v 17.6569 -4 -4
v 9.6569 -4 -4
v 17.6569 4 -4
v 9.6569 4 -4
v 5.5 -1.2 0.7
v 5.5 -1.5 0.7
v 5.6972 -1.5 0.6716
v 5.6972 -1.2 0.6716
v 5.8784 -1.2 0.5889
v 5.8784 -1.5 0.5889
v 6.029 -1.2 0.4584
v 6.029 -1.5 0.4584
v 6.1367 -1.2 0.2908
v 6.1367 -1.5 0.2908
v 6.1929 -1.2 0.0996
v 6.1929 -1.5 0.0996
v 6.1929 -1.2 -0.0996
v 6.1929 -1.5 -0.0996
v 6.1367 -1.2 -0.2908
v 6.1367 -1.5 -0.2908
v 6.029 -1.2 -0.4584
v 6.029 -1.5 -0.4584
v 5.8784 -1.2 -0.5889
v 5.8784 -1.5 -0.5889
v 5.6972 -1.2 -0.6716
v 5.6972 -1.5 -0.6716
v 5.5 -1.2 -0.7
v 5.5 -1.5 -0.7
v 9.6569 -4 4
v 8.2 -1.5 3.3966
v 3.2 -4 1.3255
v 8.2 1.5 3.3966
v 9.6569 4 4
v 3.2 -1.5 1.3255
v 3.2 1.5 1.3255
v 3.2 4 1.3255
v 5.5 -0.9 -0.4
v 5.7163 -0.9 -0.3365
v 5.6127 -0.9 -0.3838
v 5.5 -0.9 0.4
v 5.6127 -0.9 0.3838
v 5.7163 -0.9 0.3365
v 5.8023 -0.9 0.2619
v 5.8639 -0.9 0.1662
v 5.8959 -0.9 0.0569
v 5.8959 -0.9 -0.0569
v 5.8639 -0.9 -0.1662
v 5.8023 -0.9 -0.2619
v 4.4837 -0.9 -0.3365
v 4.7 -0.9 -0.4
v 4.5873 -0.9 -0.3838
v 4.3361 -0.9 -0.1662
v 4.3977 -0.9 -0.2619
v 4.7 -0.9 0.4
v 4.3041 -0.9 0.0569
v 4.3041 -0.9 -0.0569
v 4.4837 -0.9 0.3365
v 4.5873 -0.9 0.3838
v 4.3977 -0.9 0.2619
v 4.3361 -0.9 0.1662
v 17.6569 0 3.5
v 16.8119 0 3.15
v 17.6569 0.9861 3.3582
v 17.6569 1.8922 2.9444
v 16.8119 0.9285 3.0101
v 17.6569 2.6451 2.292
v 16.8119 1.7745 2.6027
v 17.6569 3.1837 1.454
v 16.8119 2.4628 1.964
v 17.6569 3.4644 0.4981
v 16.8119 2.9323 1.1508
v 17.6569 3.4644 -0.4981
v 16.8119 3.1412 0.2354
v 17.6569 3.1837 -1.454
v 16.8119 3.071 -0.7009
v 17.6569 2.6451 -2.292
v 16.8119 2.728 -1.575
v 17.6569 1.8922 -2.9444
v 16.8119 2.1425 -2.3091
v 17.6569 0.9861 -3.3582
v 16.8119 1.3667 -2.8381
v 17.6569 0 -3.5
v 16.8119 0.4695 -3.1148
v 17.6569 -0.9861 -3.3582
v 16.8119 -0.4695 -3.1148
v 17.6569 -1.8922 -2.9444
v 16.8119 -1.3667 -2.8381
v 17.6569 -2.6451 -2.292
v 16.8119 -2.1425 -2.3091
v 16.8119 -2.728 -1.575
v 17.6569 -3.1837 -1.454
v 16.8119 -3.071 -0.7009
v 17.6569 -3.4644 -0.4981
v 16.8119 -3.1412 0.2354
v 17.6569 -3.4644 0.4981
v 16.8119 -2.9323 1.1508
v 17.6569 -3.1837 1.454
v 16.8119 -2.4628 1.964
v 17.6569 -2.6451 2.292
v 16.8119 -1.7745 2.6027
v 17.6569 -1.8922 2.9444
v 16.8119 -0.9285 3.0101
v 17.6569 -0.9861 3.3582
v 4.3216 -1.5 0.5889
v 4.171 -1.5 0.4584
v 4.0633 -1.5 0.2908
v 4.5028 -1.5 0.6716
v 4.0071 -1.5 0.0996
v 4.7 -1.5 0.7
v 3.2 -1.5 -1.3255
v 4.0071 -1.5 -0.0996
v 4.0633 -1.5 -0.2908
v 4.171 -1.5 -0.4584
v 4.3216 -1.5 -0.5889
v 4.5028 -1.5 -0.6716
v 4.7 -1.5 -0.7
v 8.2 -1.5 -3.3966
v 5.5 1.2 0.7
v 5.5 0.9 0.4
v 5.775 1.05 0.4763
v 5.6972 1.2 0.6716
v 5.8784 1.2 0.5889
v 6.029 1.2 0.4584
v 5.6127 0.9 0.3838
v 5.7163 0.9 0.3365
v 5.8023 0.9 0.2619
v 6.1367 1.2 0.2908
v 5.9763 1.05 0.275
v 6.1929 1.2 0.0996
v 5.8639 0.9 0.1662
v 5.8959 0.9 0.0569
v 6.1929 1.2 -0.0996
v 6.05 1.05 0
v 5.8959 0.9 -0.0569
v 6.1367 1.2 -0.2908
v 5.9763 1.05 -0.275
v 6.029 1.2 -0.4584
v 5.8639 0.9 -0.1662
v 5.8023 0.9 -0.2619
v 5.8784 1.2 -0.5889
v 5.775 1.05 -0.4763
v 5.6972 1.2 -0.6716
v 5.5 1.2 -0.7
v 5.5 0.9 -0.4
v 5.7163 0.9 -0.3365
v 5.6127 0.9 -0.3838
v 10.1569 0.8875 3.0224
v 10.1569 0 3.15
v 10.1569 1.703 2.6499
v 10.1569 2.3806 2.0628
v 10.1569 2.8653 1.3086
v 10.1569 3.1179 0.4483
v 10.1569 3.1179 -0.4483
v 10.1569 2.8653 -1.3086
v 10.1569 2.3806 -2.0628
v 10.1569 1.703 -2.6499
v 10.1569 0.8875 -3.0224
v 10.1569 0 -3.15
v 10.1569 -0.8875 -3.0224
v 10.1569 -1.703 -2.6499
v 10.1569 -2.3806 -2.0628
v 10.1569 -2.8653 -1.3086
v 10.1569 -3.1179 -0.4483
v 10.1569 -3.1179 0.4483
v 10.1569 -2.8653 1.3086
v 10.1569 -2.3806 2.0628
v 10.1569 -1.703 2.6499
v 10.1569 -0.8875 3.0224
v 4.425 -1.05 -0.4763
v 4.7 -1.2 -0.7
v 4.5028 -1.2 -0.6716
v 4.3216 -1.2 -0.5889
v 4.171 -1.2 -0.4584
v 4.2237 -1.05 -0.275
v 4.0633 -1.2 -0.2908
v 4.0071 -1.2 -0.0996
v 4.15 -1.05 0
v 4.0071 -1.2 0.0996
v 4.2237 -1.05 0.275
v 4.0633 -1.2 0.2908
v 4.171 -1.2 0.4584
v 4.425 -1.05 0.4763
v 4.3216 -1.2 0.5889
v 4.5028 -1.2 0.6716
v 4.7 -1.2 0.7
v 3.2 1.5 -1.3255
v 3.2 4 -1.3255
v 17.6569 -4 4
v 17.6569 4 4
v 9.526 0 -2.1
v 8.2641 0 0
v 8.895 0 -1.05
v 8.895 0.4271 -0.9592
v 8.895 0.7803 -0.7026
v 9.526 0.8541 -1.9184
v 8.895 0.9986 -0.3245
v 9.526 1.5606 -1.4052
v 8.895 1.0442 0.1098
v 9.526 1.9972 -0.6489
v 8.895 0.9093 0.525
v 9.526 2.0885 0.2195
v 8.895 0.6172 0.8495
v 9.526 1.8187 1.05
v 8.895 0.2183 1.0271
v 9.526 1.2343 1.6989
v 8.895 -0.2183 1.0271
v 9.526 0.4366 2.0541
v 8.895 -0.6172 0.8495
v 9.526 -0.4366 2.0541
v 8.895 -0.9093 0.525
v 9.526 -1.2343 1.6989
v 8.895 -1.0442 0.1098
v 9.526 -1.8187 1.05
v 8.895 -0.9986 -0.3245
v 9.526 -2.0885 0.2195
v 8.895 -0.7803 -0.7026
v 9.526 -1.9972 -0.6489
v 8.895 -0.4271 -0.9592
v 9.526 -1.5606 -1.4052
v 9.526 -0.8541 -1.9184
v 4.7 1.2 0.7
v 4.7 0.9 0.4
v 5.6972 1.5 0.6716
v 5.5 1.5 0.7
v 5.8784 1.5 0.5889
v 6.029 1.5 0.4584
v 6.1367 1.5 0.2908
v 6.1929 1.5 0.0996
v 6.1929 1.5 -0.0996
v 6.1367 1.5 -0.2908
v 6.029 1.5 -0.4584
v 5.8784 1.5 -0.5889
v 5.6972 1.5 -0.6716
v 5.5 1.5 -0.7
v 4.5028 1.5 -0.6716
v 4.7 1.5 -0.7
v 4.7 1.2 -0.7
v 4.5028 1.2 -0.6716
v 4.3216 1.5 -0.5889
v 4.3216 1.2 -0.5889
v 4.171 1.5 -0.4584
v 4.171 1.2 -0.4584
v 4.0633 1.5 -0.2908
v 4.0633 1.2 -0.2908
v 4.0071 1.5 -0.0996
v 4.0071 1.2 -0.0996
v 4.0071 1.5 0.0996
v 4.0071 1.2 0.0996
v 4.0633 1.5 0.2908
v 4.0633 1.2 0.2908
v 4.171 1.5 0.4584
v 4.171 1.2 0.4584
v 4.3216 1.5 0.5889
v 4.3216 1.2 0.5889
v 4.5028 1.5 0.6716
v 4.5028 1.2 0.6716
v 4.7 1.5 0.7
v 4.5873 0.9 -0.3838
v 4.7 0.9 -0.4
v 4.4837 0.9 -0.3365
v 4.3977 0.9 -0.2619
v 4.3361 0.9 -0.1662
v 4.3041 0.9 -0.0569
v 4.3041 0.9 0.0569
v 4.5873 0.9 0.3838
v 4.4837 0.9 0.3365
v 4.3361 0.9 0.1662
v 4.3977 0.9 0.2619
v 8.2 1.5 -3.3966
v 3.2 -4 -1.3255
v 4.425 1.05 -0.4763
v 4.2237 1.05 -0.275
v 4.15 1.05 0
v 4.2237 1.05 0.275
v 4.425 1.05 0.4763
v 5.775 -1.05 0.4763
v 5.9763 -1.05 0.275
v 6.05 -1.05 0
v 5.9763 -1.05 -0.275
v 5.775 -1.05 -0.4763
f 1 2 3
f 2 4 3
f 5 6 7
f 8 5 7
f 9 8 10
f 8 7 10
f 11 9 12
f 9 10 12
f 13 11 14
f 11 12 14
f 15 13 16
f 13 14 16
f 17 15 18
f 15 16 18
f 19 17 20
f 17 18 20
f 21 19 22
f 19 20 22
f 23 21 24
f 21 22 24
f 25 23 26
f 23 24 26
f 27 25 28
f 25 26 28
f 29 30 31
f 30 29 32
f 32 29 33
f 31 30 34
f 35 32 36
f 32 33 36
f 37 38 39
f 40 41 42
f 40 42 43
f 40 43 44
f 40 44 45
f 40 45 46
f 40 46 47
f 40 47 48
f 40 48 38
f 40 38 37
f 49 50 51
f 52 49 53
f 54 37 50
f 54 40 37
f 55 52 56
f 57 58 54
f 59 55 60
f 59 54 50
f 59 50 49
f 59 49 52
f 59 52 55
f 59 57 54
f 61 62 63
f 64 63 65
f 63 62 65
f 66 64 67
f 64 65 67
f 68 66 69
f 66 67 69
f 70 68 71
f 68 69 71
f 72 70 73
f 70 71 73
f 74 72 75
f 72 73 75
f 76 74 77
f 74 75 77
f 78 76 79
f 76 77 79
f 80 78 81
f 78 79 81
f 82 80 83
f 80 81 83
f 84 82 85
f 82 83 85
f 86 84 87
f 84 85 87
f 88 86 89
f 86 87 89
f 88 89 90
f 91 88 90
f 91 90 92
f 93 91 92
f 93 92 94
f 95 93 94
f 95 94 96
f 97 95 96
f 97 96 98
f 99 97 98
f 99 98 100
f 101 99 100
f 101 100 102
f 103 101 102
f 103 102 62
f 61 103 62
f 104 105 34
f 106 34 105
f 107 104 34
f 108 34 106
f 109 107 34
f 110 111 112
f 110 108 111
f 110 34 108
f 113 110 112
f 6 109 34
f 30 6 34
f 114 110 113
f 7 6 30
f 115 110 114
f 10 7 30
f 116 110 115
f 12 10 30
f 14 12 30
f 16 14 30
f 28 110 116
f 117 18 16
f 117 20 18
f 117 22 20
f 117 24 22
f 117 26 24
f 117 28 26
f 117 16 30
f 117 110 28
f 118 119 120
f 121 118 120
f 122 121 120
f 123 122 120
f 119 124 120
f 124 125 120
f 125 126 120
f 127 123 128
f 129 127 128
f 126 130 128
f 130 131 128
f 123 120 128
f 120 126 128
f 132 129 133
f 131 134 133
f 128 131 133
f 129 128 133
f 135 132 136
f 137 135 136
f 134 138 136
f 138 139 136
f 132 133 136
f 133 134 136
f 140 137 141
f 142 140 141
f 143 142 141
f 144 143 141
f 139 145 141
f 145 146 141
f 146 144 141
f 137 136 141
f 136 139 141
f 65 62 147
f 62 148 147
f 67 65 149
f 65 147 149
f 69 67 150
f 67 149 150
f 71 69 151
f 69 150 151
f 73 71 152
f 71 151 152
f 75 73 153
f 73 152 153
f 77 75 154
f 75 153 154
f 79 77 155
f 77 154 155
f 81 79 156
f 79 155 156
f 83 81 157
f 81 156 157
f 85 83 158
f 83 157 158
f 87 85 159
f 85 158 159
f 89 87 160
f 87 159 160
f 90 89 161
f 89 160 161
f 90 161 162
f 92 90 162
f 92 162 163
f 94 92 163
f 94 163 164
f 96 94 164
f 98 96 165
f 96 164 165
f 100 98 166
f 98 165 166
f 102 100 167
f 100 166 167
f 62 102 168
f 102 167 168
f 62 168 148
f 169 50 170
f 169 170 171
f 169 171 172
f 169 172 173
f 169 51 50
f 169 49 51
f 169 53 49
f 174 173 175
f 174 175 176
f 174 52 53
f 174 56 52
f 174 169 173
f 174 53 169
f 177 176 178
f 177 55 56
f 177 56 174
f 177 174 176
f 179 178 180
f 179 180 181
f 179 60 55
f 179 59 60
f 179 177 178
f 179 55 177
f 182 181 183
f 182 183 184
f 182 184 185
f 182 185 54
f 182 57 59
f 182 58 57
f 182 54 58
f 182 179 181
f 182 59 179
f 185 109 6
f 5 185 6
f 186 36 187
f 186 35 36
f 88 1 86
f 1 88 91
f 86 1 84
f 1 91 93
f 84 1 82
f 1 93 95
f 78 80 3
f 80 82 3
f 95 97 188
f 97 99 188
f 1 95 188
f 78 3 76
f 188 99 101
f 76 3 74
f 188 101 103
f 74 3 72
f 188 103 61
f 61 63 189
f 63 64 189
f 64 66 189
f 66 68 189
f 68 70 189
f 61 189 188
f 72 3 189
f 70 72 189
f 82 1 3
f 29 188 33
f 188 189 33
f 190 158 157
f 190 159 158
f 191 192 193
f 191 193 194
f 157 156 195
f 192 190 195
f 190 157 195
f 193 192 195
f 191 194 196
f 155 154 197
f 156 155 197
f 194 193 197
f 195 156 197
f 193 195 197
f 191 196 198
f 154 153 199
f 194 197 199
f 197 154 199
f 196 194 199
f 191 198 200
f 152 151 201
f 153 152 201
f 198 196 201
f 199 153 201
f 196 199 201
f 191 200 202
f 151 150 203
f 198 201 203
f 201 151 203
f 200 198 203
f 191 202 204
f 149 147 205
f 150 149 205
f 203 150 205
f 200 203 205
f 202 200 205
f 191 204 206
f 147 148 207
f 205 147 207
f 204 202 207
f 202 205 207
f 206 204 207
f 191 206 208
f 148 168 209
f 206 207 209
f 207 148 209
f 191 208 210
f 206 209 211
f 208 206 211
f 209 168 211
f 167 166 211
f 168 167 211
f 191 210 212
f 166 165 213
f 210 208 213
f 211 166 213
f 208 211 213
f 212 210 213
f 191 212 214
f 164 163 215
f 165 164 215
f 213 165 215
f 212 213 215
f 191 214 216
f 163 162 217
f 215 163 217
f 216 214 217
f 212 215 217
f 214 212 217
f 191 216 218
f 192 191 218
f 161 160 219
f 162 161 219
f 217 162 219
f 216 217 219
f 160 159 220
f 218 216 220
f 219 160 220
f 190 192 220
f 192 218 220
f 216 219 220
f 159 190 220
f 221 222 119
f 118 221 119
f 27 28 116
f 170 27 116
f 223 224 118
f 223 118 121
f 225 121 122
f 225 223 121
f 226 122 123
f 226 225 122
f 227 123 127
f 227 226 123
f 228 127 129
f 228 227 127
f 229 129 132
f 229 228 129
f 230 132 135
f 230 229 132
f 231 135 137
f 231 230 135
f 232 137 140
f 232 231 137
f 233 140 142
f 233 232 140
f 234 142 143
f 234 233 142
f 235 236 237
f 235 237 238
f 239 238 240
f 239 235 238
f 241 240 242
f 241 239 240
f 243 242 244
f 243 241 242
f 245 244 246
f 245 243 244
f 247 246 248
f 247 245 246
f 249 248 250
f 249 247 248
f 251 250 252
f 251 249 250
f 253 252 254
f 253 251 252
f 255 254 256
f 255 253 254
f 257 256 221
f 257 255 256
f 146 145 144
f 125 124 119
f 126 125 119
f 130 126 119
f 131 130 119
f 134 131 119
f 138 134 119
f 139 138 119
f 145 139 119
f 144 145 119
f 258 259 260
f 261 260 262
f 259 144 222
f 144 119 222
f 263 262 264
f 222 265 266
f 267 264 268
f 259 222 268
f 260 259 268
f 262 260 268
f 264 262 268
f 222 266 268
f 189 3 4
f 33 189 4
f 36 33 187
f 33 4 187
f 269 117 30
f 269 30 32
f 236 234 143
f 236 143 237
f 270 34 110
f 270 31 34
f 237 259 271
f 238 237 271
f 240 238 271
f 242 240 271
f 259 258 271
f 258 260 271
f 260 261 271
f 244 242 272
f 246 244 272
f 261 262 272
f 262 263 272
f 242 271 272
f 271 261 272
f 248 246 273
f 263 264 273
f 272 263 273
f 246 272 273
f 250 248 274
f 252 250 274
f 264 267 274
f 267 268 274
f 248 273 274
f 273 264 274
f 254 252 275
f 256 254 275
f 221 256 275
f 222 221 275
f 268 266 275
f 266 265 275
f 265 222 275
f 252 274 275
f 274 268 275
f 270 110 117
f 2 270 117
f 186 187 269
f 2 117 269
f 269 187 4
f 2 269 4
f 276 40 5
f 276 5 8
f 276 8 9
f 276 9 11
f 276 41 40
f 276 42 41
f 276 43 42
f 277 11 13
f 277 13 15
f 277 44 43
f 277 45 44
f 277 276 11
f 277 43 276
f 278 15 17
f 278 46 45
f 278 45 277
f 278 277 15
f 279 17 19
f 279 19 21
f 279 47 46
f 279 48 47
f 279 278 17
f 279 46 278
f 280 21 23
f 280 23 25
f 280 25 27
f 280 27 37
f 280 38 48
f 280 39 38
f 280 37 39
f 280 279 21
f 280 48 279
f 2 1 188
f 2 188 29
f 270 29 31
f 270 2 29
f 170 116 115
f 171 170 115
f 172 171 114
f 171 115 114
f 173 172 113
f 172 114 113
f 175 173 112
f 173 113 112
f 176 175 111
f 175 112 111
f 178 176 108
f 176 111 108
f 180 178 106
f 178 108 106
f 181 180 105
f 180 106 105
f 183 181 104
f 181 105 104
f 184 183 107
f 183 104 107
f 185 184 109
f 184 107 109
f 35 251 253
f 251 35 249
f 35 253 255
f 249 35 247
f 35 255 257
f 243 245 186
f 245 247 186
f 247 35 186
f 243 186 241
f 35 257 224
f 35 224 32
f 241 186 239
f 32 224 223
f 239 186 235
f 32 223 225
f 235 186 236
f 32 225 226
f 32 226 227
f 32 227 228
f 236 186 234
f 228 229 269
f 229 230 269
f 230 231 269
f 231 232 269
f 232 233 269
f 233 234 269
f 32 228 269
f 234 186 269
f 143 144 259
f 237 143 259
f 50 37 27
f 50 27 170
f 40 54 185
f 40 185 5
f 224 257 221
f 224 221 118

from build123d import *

# Parameters (mm, degrees)
AUFSATZ_LINEAR_AUSTRAGEN1_DEPTH            = 4
SCHNITT_LINEAR_AUSTRAGEN1_DEPTH            = 19.540887303
SCHNITT_LINEAR_AUSTRAGEN1_DEPTH_BACK       = 19.540887303
SKIZZE2_W                                  = 8.2
SKIZZE2_H                                  = 3
AUFSATZ_LINEAR_AUSTRAGEN2_DEPTH            = 0.6
FASE1_SIZE                                 = 0.3
FASE1_OF_SPIEGELN1_SIZE                    = 0.3
SCHNITT_LINEAR_AUSTRAGEN2_DEPTH            = 19.540887303
SCHNITT_LINEAR_AUSTRAGEN2_DEPTH_BACK       = 19.540887303
SKIZZE10_W                                 = 3.2
SKIZZE10_H                                 = 8
F_6_3_6_3_DURCHMESSER_BOHRUNG1_D           = 6.3
F_6_3_6_3_DURCHMESSER_BOHRUNG1_DEPTH       = 7.5
F_6_3_6_3_DURCHMESSER_BOHRUNG1_CSINK_D     = 7
F_6_3_6_3_DURCHMESSER_BOHRUNG1_CSINK_ANGLE = 45
F_6_3_6_3_DURCHMESSER_BOHRUNG1_TIP         = 1.89271095


with BuildPart() as part:
    # Skizze1 → Aufsatz-Linear austragen1 (new, symmetric)
    with BuildSketch(Plane(origin=(0, 0, 0), x_dir=(1, 0, 0), z_dir=(0, 1, 0))):
        with BuildLine():
            Line((2.956414504, 1.224586984), (9.656854249, 4))
            Line((9.656854249, 4), (17.656854249, 4))
            Line((17.656854249, 4), (17.656854249, -4))
            Line((17.656854249, -4), (9.656854249, -4))
            Line((9.656854249, -4), (2.956414504, -1.224586984))
            ThreePointArc((2.956414504, -1.224586984), (3.2, 0), (2.956414504, 1.224586984))
        make_face()
    extrude(amount=AUFSATZ_LINEAR_AUSTRAGEN1_DEPTH, both=True)

    # Skizze2 → Schnitt-Linear austragen1 (cut, two sides: drawn at the far end of the back side and taken through both)
    with BuildSketch(Plane.XY.offset(-SCHNITT_LINEAR_AUSTRAGEN1_DEPTH_BACK)):
        with Locations((4.1, 0)):
            Rectangle(SKIZZE2_W, SKIZZE2_H)
    extrude(amount=SCHNITT_LINEAR_AUSTRAGEN1_DEPTH + SCHNITT_LINEAR_AUSTRAGEN1_DEPTH_BACK, mode=Mode.SUBTRACT)

    # Skizze7 → Aufsatz-Linear austragen2 (add)
    with BuildSketch(Plane.XZ.offset(-1.5)):
        with BuildLine():
            Line((4.7, 0.7), (5.5, 0.7))
            ThreePointArc((5.5, 0.7), (6.2, 0), (5.5, -0.7))
            Line((5.5, -0.7), (4.7, -0.7))
            ThreePointArc((4.7, -0.7), (4, 0), (4.7, 0.7))
        make_face()
    aufsatz_linear_austragen2 = extrude(amount=AUFSATZ_LINEAR_AUSTRAGEN2_DEPTH)

    # Fase1
    fase1_edges = [part.edges().sort_by_distance(p)[0] for p in [
        (4, 0.9, 0),
        (5.1, 0.9, -0.7),
        (6.2, 0.9, 0),
        (5.1, 0.9, 0.7),
    ]]
    chamfer(fase1_edges, length=FASE1_SIZE)

    # Spiegeln1: Aufsatz-Linear austragen2 across plane
    add(aufsatz_linear_austragen2.mirror(Plane.ZX))

    # Fase1 of Spiegeln1
    fase1_of_spiegeln1_edges = [part.edges().sort_by_distance(p)[0] for p in [
        (4, -0.9, 0),
        (5.1, -0.9, -0.7),
        (6.2, -0.9, 0),
        (5.1, -0.9, 0.7),
    ]]
    chamfer(fase1_of_spiegeln1_edges, length=FASE1_OF_SPIEGELN1_SIZE)

    # Skizze10 → Schnitt-Linear austragen2 (cut, two sides: drawn at the far end of the back side and taken through both)
    with BuildSketch(Plane(origin=(0, 0, 0), x_dir=(1, 0, 0), z_dir=(0, 1, 0)).offset(-SCHNITT_LINEAR_AUSTRAGEN2_DEPTH_BACK)):
        with Locations((1.6, 0)):
            Rectangle(SKIZZE10_W, SKIZZE10_H)
    extrude(amount=SCHNITT_LINEAR_AUSTRAGEN2_DEPTH + SCHNITT_LINEAR_AUSTRAGEN2_DEPTH_BACK, mode=Mode.SUBTRACT)

    # Ø6.3 (6.3) Durchmesser Bohrung1
    with Locations(Plane(origin=(17.656854249, 0, 0), x_dir=(0, 0, -1), z_dir=(1, 0, 0))):
        with Locations((0, 0)):
            CounterSinkHole(F_6_3_6_3_DURCHMESSER_BOHRUNG1_D / 2, F_6_3_6_3_DURCHMESSER_BOHRUNG1_CSINK_D / 2, depth=F_6_3_6_3_DURCHMESSER_BOHRUNG1_DEPTH, counter_sink_angle=F_6_3_6_3_DURCHMESSER_BOHRUNG1_CSINK_ANGLE)
            with Locations((0, 0, -(F_6_3_6_3_DURCHMESSER_BOHRUNG1_DEPTH + F_6_3_6_3_DURCHMESSER_BOHRUNG1_TIP / 2))):  # 118° drill point
                Cone(0, F_6_3_6_3_DURCHMESSER_BOHRUNG1_D / 2, F_6_3_6_3_DURCHMESSER_BOHRUNG1_TIP, mode=Mode.SUBTRACT)


solid = part.part
